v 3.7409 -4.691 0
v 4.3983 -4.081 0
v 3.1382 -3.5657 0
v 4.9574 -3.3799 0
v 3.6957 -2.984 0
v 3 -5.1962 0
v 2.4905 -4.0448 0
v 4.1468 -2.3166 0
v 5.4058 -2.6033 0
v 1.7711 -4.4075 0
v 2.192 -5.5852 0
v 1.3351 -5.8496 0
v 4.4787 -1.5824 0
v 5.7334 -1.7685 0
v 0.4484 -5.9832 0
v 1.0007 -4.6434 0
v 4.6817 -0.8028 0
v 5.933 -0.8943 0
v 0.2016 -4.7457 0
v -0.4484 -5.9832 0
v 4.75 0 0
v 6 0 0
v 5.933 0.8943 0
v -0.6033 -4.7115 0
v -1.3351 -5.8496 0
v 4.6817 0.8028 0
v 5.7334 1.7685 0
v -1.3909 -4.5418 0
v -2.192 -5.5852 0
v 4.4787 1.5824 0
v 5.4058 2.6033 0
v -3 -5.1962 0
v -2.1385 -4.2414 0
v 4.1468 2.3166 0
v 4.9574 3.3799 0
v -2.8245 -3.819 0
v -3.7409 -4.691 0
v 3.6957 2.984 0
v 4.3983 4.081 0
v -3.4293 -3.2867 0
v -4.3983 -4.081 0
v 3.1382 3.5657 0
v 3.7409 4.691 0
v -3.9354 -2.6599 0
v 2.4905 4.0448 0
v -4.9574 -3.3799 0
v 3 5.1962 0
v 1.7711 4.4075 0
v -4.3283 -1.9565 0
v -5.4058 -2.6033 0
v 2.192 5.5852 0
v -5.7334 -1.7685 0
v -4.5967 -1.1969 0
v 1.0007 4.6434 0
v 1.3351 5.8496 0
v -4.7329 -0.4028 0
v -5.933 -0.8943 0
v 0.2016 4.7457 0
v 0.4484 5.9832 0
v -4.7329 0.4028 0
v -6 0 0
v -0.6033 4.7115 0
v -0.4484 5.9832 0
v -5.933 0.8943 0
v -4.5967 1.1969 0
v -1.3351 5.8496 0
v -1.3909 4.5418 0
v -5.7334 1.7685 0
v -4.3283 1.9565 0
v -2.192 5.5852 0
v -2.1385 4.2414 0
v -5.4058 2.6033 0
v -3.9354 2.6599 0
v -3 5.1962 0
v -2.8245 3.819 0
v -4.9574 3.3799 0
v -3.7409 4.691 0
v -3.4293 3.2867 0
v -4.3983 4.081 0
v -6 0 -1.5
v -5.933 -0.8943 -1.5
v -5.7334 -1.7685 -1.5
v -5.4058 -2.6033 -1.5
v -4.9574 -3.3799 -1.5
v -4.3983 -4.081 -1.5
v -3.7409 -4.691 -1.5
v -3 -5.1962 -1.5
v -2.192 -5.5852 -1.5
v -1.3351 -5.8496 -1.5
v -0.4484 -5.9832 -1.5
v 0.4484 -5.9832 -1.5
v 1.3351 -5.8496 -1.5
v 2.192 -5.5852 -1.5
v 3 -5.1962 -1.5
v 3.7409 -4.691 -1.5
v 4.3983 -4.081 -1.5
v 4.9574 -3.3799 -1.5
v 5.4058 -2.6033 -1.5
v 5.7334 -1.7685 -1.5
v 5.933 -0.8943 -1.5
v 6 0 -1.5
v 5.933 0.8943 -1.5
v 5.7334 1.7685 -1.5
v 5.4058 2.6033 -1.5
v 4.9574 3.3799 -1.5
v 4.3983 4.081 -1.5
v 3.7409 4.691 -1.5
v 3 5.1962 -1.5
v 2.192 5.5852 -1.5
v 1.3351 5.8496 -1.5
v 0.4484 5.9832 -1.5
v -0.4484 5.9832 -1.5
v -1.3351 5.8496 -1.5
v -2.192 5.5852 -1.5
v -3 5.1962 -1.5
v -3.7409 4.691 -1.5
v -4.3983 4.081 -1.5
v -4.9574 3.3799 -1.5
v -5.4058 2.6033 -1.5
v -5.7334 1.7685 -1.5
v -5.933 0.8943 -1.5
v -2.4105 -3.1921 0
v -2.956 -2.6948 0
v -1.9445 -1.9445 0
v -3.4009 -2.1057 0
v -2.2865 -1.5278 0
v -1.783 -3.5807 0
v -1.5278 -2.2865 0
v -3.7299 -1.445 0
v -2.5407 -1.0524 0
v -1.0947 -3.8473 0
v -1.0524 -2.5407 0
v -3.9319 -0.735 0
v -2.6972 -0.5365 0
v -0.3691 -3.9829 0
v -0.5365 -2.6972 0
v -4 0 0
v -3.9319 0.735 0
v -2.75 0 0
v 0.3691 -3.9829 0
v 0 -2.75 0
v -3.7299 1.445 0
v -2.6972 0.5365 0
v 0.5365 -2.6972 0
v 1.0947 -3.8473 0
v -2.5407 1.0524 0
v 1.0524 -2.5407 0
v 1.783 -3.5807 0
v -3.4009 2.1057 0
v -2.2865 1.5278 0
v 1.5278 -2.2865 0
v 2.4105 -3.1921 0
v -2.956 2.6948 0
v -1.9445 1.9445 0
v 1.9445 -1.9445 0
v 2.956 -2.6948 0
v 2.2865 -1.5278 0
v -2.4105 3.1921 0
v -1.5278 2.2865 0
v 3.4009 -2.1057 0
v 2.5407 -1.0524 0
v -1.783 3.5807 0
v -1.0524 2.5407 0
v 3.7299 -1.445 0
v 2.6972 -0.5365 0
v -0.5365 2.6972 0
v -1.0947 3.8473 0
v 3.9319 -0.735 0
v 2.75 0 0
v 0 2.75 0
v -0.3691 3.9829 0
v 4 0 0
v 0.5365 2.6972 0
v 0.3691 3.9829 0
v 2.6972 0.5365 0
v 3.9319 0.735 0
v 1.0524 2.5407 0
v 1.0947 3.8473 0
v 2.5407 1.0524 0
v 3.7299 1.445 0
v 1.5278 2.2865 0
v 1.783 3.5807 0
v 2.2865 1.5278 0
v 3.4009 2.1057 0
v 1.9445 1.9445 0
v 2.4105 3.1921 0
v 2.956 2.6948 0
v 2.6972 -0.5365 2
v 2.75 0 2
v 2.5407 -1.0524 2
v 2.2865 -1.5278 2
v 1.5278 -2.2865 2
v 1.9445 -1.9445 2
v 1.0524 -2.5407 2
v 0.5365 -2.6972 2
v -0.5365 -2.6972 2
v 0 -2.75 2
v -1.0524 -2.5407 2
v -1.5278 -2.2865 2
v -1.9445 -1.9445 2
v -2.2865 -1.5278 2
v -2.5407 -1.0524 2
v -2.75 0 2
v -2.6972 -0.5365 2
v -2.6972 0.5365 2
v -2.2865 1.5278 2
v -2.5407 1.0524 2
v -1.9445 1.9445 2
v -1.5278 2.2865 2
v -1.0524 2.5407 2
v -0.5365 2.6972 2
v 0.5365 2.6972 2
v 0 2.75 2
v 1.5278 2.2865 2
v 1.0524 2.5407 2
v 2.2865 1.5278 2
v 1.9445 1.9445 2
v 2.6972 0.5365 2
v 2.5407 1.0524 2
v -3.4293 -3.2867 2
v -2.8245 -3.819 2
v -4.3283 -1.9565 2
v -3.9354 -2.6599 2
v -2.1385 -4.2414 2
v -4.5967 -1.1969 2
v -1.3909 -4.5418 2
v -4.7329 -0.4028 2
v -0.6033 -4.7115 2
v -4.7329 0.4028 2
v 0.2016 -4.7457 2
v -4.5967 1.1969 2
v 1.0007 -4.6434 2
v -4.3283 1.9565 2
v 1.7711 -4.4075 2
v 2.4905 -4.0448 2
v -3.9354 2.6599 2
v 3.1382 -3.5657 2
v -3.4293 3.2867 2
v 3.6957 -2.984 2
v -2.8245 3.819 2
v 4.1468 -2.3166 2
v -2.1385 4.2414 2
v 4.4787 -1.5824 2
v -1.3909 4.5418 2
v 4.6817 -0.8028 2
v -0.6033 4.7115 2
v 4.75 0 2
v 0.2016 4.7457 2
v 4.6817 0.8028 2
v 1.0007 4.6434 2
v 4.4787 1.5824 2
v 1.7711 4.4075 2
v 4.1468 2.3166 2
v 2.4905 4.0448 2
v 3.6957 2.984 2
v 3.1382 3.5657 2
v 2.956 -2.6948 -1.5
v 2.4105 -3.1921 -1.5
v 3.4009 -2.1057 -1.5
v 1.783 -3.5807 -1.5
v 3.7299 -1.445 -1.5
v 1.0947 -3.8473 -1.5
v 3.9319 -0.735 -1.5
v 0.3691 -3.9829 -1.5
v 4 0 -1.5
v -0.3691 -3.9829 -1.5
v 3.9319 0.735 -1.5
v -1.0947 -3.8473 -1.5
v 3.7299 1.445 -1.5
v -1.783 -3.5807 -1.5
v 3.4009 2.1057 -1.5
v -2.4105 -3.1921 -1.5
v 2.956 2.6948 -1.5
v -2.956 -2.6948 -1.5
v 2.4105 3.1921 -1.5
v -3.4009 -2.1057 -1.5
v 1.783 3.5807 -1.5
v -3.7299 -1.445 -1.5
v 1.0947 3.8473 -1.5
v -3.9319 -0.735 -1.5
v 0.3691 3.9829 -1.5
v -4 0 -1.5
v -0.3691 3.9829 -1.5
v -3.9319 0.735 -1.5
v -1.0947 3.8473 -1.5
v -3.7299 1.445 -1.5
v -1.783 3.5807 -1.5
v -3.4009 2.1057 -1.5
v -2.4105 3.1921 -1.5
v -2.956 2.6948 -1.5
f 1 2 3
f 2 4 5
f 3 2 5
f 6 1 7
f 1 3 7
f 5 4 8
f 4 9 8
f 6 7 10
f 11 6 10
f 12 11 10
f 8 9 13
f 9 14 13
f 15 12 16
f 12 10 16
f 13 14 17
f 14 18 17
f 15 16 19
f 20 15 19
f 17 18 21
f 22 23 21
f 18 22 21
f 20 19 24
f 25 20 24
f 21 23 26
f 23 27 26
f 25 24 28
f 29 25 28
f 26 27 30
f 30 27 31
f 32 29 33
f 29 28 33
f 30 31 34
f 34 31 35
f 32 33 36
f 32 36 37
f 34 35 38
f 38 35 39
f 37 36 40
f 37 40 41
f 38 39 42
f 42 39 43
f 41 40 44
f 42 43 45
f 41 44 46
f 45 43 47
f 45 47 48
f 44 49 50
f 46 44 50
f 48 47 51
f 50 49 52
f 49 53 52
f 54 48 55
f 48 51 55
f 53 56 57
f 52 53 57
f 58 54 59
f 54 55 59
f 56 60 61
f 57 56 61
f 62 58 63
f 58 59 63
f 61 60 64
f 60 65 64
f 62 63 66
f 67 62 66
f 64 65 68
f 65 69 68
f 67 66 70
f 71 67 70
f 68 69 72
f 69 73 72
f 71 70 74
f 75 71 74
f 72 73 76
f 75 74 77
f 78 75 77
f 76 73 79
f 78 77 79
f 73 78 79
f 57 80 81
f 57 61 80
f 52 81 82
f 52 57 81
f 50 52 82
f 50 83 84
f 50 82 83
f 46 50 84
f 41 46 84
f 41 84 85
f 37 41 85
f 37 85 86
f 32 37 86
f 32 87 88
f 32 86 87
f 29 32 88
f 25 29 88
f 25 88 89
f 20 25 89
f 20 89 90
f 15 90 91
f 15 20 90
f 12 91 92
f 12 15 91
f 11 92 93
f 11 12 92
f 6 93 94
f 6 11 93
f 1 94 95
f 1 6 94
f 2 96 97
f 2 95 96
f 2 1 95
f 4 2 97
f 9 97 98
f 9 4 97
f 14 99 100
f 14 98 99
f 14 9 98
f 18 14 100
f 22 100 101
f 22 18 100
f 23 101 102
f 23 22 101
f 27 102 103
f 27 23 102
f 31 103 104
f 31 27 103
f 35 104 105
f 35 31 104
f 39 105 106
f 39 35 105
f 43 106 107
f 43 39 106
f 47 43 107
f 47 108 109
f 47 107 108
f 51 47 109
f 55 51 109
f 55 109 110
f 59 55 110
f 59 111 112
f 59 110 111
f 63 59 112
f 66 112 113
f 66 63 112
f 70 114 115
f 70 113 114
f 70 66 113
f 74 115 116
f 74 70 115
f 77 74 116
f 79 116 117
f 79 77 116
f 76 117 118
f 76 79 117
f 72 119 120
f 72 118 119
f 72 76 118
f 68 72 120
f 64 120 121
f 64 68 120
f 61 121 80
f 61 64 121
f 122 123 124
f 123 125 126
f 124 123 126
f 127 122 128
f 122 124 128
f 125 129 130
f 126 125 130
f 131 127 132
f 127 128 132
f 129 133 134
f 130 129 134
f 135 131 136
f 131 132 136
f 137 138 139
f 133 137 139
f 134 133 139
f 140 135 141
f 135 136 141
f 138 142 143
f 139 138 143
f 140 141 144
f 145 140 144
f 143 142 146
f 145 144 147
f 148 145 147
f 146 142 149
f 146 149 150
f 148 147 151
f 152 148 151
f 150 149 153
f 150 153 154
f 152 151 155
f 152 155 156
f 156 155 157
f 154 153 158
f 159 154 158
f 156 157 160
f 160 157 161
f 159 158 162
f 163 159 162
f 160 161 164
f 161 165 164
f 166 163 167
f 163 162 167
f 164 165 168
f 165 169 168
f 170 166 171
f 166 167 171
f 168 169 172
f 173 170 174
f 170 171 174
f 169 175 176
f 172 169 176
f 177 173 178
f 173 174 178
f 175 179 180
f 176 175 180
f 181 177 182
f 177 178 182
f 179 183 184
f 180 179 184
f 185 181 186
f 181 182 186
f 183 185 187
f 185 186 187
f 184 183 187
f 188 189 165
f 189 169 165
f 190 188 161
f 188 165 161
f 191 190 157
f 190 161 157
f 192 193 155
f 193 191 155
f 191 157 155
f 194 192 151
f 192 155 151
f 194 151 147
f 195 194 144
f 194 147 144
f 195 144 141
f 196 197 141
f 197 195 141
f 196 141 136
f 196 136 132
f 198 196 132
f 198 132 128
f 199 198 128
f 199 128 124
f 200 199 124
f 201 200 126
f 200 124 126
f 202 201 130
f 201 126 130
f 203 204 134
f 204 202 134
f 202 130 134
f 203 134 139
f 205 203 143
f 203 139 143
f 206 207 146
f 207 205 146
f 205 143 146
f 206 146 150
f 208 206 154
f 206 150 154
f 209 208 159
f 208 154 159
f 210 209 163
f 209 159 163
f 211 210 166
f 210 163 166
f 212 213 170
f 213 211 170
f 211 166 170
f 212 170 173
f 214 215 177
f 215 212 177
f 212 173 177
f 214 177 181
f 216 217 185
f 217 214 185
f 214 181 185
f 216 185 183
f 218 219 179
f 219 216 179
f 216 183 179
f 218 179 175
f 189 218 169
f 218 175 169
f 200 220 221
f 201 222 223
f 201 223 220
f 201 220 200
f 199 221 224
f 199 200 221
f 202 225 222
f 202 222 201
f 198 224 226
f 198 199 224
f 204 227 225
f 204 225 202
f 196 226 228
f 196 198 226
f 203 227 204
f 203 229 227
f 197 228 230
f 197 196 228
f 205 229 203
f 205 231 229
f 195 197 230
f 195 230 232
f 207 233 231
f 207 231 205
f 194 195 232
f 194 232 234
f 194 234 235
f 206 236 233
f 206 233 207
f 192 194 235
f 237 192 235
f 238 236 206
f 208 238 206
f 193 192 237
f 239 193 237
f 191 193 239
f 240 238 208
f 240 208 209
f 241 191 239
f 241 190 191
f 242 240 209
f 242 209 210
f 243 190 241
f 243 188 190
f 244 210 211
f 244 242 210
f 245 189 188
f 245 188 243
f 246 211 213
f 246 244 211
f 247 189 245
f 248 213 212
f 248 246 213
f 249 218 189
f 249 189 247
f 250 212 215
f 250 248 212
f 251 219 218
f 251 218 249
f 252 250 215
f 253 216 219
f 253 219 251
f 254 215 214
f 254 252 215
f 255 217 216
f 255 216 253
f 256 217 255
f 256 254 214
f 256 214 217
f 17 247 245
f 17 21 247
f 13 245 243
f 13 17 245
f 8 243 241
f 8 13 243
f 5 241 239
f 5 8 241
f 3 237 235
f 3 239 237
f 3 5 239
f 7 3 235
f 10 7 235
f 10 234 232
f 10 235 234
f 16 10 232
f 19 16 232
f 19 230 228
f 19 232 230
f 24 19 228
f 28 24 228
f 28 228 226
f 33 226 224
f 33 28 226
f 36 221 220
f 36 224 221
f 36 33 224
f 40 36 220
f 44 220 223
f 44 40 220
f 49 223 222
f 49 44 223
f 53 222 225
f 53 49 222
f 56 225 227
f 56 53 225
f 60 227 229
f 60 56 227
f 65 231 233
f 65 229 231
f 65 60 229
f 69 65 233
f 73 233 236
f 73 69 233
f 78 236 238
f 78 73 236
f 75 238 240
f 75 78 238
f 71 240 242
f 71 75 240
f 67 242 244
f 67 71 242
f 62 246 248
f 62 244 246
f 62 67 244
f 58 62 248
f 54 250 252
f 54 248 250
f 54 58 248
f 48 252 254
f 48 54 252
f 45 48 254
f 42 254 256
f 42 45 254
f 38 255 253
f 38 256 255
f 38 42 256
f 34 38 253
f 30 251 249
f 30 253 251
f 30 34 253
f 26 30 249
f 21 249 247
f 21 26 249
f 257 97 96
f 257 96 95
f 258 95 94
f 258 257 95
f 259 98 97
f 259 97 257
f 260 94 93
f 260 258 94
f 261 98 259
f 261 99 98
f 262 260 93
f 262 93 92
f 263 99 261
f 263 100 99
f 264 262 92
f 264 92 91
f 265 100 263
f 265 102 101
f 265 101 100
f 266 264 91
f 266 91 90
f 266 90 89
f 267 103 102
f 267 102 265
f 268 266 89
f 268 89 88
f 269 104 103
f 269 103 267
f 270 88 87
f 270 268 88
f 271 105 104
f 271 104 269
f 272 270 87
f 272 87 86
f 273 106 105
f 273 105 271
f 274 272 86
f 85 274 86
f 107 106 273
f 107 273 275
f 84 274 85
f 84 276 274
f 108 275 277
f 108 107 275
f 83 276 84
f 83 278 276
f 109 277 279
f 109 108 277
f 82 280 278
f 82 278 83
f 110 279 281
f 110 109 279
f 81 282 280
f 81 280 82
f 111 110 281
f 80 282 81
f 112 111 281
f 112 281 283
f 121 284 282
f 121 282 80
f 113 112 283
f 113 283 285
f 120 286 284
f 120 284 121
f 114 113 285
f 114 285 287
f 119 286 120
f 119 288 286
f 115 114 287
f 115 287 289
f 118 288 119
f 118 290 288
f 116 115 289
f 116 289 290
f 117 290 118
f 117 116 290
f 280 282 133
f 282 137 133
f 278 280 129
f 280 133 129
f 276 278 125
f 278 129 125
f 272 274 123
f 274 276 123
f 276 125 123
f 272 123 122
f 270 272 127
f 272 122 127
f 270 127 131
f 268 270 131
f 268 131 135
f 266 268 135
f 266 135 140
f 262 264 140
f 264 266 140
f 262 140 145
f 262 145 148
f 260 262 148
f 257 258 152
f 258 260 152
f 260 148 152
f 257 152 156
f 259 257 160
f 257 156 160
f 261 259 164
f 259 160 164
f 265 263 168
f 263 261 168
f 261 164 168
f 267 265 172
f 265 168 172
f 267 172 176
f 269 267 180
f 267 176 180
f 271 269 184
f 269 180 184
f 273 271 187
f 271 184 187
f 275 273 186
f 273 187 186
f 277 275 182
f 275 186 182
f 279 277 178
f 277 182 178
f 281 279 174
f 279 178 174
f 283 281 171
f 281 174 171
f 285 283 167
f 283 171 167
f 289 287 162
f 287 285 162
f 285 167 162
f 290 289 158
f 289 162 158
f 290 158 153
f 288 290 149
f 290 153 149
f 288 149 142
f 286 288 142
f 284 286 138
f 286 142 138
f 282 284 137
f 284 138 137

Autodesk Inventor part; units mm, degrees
ref_plane "YZ Plane" through (0, 0, 0) normal (1, 0, 0) x (0, 1, 0)
ref_plane "XZ Plane" through (0, 0, 0) normal (0, 1, 0) x (-1, 0, 0)
ref_plane "XY Plane" through (0, 0, 0) normal (0, 0, 1) x (1, 0, 0)
sketch "Sketch1" plane through (0, 0, 0) normal (0, 0, 1) x (1, 0, 0)
  circle A0 centre (0, 0) radius 2.75
  circle A1 centre (0, 0) radius 4.75
  dimension "d0" = 5.5
  dimension "d1" = 2
extrude "Extrusion1" add sketch "Sketch1" along normal blind 2
sketch "Sketch2" plane through (0, 0, 0) normal (0, 0, -1) x (-1, 0, 0)
  circle A0 centre (0, 0) radius 4.75 projected
  circle A1 centre (0, 0) radius 4
  circle A2 centre (0, 0) radius 6
  dimension "d4" = 8
  dimension "d5" = 2
extrude "Extrusion2" add sketch "Sketch2" along normal blind 1.5 contours A0 | A2
properties part number "ArmBaseEncoderAlignmentFlange"
